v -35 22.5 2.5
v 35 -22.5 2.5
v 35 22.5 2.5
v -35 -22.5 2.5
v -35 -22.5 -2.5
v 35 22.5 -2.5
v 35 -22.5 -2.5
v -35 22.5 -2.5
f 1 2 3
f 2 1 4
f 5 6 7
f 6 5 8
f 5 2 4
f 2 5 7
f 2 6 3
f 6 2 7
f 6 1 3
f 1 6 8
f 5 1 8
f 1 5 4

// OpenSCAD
// Starter file for task-008.
// Edit this file in OpenSCAD to complete the requested hard task.
$fn = 64;

base_w = 70;
base_d = 45;
base_t = 5;
cube([base_w, base_d, base_t], center=true);
